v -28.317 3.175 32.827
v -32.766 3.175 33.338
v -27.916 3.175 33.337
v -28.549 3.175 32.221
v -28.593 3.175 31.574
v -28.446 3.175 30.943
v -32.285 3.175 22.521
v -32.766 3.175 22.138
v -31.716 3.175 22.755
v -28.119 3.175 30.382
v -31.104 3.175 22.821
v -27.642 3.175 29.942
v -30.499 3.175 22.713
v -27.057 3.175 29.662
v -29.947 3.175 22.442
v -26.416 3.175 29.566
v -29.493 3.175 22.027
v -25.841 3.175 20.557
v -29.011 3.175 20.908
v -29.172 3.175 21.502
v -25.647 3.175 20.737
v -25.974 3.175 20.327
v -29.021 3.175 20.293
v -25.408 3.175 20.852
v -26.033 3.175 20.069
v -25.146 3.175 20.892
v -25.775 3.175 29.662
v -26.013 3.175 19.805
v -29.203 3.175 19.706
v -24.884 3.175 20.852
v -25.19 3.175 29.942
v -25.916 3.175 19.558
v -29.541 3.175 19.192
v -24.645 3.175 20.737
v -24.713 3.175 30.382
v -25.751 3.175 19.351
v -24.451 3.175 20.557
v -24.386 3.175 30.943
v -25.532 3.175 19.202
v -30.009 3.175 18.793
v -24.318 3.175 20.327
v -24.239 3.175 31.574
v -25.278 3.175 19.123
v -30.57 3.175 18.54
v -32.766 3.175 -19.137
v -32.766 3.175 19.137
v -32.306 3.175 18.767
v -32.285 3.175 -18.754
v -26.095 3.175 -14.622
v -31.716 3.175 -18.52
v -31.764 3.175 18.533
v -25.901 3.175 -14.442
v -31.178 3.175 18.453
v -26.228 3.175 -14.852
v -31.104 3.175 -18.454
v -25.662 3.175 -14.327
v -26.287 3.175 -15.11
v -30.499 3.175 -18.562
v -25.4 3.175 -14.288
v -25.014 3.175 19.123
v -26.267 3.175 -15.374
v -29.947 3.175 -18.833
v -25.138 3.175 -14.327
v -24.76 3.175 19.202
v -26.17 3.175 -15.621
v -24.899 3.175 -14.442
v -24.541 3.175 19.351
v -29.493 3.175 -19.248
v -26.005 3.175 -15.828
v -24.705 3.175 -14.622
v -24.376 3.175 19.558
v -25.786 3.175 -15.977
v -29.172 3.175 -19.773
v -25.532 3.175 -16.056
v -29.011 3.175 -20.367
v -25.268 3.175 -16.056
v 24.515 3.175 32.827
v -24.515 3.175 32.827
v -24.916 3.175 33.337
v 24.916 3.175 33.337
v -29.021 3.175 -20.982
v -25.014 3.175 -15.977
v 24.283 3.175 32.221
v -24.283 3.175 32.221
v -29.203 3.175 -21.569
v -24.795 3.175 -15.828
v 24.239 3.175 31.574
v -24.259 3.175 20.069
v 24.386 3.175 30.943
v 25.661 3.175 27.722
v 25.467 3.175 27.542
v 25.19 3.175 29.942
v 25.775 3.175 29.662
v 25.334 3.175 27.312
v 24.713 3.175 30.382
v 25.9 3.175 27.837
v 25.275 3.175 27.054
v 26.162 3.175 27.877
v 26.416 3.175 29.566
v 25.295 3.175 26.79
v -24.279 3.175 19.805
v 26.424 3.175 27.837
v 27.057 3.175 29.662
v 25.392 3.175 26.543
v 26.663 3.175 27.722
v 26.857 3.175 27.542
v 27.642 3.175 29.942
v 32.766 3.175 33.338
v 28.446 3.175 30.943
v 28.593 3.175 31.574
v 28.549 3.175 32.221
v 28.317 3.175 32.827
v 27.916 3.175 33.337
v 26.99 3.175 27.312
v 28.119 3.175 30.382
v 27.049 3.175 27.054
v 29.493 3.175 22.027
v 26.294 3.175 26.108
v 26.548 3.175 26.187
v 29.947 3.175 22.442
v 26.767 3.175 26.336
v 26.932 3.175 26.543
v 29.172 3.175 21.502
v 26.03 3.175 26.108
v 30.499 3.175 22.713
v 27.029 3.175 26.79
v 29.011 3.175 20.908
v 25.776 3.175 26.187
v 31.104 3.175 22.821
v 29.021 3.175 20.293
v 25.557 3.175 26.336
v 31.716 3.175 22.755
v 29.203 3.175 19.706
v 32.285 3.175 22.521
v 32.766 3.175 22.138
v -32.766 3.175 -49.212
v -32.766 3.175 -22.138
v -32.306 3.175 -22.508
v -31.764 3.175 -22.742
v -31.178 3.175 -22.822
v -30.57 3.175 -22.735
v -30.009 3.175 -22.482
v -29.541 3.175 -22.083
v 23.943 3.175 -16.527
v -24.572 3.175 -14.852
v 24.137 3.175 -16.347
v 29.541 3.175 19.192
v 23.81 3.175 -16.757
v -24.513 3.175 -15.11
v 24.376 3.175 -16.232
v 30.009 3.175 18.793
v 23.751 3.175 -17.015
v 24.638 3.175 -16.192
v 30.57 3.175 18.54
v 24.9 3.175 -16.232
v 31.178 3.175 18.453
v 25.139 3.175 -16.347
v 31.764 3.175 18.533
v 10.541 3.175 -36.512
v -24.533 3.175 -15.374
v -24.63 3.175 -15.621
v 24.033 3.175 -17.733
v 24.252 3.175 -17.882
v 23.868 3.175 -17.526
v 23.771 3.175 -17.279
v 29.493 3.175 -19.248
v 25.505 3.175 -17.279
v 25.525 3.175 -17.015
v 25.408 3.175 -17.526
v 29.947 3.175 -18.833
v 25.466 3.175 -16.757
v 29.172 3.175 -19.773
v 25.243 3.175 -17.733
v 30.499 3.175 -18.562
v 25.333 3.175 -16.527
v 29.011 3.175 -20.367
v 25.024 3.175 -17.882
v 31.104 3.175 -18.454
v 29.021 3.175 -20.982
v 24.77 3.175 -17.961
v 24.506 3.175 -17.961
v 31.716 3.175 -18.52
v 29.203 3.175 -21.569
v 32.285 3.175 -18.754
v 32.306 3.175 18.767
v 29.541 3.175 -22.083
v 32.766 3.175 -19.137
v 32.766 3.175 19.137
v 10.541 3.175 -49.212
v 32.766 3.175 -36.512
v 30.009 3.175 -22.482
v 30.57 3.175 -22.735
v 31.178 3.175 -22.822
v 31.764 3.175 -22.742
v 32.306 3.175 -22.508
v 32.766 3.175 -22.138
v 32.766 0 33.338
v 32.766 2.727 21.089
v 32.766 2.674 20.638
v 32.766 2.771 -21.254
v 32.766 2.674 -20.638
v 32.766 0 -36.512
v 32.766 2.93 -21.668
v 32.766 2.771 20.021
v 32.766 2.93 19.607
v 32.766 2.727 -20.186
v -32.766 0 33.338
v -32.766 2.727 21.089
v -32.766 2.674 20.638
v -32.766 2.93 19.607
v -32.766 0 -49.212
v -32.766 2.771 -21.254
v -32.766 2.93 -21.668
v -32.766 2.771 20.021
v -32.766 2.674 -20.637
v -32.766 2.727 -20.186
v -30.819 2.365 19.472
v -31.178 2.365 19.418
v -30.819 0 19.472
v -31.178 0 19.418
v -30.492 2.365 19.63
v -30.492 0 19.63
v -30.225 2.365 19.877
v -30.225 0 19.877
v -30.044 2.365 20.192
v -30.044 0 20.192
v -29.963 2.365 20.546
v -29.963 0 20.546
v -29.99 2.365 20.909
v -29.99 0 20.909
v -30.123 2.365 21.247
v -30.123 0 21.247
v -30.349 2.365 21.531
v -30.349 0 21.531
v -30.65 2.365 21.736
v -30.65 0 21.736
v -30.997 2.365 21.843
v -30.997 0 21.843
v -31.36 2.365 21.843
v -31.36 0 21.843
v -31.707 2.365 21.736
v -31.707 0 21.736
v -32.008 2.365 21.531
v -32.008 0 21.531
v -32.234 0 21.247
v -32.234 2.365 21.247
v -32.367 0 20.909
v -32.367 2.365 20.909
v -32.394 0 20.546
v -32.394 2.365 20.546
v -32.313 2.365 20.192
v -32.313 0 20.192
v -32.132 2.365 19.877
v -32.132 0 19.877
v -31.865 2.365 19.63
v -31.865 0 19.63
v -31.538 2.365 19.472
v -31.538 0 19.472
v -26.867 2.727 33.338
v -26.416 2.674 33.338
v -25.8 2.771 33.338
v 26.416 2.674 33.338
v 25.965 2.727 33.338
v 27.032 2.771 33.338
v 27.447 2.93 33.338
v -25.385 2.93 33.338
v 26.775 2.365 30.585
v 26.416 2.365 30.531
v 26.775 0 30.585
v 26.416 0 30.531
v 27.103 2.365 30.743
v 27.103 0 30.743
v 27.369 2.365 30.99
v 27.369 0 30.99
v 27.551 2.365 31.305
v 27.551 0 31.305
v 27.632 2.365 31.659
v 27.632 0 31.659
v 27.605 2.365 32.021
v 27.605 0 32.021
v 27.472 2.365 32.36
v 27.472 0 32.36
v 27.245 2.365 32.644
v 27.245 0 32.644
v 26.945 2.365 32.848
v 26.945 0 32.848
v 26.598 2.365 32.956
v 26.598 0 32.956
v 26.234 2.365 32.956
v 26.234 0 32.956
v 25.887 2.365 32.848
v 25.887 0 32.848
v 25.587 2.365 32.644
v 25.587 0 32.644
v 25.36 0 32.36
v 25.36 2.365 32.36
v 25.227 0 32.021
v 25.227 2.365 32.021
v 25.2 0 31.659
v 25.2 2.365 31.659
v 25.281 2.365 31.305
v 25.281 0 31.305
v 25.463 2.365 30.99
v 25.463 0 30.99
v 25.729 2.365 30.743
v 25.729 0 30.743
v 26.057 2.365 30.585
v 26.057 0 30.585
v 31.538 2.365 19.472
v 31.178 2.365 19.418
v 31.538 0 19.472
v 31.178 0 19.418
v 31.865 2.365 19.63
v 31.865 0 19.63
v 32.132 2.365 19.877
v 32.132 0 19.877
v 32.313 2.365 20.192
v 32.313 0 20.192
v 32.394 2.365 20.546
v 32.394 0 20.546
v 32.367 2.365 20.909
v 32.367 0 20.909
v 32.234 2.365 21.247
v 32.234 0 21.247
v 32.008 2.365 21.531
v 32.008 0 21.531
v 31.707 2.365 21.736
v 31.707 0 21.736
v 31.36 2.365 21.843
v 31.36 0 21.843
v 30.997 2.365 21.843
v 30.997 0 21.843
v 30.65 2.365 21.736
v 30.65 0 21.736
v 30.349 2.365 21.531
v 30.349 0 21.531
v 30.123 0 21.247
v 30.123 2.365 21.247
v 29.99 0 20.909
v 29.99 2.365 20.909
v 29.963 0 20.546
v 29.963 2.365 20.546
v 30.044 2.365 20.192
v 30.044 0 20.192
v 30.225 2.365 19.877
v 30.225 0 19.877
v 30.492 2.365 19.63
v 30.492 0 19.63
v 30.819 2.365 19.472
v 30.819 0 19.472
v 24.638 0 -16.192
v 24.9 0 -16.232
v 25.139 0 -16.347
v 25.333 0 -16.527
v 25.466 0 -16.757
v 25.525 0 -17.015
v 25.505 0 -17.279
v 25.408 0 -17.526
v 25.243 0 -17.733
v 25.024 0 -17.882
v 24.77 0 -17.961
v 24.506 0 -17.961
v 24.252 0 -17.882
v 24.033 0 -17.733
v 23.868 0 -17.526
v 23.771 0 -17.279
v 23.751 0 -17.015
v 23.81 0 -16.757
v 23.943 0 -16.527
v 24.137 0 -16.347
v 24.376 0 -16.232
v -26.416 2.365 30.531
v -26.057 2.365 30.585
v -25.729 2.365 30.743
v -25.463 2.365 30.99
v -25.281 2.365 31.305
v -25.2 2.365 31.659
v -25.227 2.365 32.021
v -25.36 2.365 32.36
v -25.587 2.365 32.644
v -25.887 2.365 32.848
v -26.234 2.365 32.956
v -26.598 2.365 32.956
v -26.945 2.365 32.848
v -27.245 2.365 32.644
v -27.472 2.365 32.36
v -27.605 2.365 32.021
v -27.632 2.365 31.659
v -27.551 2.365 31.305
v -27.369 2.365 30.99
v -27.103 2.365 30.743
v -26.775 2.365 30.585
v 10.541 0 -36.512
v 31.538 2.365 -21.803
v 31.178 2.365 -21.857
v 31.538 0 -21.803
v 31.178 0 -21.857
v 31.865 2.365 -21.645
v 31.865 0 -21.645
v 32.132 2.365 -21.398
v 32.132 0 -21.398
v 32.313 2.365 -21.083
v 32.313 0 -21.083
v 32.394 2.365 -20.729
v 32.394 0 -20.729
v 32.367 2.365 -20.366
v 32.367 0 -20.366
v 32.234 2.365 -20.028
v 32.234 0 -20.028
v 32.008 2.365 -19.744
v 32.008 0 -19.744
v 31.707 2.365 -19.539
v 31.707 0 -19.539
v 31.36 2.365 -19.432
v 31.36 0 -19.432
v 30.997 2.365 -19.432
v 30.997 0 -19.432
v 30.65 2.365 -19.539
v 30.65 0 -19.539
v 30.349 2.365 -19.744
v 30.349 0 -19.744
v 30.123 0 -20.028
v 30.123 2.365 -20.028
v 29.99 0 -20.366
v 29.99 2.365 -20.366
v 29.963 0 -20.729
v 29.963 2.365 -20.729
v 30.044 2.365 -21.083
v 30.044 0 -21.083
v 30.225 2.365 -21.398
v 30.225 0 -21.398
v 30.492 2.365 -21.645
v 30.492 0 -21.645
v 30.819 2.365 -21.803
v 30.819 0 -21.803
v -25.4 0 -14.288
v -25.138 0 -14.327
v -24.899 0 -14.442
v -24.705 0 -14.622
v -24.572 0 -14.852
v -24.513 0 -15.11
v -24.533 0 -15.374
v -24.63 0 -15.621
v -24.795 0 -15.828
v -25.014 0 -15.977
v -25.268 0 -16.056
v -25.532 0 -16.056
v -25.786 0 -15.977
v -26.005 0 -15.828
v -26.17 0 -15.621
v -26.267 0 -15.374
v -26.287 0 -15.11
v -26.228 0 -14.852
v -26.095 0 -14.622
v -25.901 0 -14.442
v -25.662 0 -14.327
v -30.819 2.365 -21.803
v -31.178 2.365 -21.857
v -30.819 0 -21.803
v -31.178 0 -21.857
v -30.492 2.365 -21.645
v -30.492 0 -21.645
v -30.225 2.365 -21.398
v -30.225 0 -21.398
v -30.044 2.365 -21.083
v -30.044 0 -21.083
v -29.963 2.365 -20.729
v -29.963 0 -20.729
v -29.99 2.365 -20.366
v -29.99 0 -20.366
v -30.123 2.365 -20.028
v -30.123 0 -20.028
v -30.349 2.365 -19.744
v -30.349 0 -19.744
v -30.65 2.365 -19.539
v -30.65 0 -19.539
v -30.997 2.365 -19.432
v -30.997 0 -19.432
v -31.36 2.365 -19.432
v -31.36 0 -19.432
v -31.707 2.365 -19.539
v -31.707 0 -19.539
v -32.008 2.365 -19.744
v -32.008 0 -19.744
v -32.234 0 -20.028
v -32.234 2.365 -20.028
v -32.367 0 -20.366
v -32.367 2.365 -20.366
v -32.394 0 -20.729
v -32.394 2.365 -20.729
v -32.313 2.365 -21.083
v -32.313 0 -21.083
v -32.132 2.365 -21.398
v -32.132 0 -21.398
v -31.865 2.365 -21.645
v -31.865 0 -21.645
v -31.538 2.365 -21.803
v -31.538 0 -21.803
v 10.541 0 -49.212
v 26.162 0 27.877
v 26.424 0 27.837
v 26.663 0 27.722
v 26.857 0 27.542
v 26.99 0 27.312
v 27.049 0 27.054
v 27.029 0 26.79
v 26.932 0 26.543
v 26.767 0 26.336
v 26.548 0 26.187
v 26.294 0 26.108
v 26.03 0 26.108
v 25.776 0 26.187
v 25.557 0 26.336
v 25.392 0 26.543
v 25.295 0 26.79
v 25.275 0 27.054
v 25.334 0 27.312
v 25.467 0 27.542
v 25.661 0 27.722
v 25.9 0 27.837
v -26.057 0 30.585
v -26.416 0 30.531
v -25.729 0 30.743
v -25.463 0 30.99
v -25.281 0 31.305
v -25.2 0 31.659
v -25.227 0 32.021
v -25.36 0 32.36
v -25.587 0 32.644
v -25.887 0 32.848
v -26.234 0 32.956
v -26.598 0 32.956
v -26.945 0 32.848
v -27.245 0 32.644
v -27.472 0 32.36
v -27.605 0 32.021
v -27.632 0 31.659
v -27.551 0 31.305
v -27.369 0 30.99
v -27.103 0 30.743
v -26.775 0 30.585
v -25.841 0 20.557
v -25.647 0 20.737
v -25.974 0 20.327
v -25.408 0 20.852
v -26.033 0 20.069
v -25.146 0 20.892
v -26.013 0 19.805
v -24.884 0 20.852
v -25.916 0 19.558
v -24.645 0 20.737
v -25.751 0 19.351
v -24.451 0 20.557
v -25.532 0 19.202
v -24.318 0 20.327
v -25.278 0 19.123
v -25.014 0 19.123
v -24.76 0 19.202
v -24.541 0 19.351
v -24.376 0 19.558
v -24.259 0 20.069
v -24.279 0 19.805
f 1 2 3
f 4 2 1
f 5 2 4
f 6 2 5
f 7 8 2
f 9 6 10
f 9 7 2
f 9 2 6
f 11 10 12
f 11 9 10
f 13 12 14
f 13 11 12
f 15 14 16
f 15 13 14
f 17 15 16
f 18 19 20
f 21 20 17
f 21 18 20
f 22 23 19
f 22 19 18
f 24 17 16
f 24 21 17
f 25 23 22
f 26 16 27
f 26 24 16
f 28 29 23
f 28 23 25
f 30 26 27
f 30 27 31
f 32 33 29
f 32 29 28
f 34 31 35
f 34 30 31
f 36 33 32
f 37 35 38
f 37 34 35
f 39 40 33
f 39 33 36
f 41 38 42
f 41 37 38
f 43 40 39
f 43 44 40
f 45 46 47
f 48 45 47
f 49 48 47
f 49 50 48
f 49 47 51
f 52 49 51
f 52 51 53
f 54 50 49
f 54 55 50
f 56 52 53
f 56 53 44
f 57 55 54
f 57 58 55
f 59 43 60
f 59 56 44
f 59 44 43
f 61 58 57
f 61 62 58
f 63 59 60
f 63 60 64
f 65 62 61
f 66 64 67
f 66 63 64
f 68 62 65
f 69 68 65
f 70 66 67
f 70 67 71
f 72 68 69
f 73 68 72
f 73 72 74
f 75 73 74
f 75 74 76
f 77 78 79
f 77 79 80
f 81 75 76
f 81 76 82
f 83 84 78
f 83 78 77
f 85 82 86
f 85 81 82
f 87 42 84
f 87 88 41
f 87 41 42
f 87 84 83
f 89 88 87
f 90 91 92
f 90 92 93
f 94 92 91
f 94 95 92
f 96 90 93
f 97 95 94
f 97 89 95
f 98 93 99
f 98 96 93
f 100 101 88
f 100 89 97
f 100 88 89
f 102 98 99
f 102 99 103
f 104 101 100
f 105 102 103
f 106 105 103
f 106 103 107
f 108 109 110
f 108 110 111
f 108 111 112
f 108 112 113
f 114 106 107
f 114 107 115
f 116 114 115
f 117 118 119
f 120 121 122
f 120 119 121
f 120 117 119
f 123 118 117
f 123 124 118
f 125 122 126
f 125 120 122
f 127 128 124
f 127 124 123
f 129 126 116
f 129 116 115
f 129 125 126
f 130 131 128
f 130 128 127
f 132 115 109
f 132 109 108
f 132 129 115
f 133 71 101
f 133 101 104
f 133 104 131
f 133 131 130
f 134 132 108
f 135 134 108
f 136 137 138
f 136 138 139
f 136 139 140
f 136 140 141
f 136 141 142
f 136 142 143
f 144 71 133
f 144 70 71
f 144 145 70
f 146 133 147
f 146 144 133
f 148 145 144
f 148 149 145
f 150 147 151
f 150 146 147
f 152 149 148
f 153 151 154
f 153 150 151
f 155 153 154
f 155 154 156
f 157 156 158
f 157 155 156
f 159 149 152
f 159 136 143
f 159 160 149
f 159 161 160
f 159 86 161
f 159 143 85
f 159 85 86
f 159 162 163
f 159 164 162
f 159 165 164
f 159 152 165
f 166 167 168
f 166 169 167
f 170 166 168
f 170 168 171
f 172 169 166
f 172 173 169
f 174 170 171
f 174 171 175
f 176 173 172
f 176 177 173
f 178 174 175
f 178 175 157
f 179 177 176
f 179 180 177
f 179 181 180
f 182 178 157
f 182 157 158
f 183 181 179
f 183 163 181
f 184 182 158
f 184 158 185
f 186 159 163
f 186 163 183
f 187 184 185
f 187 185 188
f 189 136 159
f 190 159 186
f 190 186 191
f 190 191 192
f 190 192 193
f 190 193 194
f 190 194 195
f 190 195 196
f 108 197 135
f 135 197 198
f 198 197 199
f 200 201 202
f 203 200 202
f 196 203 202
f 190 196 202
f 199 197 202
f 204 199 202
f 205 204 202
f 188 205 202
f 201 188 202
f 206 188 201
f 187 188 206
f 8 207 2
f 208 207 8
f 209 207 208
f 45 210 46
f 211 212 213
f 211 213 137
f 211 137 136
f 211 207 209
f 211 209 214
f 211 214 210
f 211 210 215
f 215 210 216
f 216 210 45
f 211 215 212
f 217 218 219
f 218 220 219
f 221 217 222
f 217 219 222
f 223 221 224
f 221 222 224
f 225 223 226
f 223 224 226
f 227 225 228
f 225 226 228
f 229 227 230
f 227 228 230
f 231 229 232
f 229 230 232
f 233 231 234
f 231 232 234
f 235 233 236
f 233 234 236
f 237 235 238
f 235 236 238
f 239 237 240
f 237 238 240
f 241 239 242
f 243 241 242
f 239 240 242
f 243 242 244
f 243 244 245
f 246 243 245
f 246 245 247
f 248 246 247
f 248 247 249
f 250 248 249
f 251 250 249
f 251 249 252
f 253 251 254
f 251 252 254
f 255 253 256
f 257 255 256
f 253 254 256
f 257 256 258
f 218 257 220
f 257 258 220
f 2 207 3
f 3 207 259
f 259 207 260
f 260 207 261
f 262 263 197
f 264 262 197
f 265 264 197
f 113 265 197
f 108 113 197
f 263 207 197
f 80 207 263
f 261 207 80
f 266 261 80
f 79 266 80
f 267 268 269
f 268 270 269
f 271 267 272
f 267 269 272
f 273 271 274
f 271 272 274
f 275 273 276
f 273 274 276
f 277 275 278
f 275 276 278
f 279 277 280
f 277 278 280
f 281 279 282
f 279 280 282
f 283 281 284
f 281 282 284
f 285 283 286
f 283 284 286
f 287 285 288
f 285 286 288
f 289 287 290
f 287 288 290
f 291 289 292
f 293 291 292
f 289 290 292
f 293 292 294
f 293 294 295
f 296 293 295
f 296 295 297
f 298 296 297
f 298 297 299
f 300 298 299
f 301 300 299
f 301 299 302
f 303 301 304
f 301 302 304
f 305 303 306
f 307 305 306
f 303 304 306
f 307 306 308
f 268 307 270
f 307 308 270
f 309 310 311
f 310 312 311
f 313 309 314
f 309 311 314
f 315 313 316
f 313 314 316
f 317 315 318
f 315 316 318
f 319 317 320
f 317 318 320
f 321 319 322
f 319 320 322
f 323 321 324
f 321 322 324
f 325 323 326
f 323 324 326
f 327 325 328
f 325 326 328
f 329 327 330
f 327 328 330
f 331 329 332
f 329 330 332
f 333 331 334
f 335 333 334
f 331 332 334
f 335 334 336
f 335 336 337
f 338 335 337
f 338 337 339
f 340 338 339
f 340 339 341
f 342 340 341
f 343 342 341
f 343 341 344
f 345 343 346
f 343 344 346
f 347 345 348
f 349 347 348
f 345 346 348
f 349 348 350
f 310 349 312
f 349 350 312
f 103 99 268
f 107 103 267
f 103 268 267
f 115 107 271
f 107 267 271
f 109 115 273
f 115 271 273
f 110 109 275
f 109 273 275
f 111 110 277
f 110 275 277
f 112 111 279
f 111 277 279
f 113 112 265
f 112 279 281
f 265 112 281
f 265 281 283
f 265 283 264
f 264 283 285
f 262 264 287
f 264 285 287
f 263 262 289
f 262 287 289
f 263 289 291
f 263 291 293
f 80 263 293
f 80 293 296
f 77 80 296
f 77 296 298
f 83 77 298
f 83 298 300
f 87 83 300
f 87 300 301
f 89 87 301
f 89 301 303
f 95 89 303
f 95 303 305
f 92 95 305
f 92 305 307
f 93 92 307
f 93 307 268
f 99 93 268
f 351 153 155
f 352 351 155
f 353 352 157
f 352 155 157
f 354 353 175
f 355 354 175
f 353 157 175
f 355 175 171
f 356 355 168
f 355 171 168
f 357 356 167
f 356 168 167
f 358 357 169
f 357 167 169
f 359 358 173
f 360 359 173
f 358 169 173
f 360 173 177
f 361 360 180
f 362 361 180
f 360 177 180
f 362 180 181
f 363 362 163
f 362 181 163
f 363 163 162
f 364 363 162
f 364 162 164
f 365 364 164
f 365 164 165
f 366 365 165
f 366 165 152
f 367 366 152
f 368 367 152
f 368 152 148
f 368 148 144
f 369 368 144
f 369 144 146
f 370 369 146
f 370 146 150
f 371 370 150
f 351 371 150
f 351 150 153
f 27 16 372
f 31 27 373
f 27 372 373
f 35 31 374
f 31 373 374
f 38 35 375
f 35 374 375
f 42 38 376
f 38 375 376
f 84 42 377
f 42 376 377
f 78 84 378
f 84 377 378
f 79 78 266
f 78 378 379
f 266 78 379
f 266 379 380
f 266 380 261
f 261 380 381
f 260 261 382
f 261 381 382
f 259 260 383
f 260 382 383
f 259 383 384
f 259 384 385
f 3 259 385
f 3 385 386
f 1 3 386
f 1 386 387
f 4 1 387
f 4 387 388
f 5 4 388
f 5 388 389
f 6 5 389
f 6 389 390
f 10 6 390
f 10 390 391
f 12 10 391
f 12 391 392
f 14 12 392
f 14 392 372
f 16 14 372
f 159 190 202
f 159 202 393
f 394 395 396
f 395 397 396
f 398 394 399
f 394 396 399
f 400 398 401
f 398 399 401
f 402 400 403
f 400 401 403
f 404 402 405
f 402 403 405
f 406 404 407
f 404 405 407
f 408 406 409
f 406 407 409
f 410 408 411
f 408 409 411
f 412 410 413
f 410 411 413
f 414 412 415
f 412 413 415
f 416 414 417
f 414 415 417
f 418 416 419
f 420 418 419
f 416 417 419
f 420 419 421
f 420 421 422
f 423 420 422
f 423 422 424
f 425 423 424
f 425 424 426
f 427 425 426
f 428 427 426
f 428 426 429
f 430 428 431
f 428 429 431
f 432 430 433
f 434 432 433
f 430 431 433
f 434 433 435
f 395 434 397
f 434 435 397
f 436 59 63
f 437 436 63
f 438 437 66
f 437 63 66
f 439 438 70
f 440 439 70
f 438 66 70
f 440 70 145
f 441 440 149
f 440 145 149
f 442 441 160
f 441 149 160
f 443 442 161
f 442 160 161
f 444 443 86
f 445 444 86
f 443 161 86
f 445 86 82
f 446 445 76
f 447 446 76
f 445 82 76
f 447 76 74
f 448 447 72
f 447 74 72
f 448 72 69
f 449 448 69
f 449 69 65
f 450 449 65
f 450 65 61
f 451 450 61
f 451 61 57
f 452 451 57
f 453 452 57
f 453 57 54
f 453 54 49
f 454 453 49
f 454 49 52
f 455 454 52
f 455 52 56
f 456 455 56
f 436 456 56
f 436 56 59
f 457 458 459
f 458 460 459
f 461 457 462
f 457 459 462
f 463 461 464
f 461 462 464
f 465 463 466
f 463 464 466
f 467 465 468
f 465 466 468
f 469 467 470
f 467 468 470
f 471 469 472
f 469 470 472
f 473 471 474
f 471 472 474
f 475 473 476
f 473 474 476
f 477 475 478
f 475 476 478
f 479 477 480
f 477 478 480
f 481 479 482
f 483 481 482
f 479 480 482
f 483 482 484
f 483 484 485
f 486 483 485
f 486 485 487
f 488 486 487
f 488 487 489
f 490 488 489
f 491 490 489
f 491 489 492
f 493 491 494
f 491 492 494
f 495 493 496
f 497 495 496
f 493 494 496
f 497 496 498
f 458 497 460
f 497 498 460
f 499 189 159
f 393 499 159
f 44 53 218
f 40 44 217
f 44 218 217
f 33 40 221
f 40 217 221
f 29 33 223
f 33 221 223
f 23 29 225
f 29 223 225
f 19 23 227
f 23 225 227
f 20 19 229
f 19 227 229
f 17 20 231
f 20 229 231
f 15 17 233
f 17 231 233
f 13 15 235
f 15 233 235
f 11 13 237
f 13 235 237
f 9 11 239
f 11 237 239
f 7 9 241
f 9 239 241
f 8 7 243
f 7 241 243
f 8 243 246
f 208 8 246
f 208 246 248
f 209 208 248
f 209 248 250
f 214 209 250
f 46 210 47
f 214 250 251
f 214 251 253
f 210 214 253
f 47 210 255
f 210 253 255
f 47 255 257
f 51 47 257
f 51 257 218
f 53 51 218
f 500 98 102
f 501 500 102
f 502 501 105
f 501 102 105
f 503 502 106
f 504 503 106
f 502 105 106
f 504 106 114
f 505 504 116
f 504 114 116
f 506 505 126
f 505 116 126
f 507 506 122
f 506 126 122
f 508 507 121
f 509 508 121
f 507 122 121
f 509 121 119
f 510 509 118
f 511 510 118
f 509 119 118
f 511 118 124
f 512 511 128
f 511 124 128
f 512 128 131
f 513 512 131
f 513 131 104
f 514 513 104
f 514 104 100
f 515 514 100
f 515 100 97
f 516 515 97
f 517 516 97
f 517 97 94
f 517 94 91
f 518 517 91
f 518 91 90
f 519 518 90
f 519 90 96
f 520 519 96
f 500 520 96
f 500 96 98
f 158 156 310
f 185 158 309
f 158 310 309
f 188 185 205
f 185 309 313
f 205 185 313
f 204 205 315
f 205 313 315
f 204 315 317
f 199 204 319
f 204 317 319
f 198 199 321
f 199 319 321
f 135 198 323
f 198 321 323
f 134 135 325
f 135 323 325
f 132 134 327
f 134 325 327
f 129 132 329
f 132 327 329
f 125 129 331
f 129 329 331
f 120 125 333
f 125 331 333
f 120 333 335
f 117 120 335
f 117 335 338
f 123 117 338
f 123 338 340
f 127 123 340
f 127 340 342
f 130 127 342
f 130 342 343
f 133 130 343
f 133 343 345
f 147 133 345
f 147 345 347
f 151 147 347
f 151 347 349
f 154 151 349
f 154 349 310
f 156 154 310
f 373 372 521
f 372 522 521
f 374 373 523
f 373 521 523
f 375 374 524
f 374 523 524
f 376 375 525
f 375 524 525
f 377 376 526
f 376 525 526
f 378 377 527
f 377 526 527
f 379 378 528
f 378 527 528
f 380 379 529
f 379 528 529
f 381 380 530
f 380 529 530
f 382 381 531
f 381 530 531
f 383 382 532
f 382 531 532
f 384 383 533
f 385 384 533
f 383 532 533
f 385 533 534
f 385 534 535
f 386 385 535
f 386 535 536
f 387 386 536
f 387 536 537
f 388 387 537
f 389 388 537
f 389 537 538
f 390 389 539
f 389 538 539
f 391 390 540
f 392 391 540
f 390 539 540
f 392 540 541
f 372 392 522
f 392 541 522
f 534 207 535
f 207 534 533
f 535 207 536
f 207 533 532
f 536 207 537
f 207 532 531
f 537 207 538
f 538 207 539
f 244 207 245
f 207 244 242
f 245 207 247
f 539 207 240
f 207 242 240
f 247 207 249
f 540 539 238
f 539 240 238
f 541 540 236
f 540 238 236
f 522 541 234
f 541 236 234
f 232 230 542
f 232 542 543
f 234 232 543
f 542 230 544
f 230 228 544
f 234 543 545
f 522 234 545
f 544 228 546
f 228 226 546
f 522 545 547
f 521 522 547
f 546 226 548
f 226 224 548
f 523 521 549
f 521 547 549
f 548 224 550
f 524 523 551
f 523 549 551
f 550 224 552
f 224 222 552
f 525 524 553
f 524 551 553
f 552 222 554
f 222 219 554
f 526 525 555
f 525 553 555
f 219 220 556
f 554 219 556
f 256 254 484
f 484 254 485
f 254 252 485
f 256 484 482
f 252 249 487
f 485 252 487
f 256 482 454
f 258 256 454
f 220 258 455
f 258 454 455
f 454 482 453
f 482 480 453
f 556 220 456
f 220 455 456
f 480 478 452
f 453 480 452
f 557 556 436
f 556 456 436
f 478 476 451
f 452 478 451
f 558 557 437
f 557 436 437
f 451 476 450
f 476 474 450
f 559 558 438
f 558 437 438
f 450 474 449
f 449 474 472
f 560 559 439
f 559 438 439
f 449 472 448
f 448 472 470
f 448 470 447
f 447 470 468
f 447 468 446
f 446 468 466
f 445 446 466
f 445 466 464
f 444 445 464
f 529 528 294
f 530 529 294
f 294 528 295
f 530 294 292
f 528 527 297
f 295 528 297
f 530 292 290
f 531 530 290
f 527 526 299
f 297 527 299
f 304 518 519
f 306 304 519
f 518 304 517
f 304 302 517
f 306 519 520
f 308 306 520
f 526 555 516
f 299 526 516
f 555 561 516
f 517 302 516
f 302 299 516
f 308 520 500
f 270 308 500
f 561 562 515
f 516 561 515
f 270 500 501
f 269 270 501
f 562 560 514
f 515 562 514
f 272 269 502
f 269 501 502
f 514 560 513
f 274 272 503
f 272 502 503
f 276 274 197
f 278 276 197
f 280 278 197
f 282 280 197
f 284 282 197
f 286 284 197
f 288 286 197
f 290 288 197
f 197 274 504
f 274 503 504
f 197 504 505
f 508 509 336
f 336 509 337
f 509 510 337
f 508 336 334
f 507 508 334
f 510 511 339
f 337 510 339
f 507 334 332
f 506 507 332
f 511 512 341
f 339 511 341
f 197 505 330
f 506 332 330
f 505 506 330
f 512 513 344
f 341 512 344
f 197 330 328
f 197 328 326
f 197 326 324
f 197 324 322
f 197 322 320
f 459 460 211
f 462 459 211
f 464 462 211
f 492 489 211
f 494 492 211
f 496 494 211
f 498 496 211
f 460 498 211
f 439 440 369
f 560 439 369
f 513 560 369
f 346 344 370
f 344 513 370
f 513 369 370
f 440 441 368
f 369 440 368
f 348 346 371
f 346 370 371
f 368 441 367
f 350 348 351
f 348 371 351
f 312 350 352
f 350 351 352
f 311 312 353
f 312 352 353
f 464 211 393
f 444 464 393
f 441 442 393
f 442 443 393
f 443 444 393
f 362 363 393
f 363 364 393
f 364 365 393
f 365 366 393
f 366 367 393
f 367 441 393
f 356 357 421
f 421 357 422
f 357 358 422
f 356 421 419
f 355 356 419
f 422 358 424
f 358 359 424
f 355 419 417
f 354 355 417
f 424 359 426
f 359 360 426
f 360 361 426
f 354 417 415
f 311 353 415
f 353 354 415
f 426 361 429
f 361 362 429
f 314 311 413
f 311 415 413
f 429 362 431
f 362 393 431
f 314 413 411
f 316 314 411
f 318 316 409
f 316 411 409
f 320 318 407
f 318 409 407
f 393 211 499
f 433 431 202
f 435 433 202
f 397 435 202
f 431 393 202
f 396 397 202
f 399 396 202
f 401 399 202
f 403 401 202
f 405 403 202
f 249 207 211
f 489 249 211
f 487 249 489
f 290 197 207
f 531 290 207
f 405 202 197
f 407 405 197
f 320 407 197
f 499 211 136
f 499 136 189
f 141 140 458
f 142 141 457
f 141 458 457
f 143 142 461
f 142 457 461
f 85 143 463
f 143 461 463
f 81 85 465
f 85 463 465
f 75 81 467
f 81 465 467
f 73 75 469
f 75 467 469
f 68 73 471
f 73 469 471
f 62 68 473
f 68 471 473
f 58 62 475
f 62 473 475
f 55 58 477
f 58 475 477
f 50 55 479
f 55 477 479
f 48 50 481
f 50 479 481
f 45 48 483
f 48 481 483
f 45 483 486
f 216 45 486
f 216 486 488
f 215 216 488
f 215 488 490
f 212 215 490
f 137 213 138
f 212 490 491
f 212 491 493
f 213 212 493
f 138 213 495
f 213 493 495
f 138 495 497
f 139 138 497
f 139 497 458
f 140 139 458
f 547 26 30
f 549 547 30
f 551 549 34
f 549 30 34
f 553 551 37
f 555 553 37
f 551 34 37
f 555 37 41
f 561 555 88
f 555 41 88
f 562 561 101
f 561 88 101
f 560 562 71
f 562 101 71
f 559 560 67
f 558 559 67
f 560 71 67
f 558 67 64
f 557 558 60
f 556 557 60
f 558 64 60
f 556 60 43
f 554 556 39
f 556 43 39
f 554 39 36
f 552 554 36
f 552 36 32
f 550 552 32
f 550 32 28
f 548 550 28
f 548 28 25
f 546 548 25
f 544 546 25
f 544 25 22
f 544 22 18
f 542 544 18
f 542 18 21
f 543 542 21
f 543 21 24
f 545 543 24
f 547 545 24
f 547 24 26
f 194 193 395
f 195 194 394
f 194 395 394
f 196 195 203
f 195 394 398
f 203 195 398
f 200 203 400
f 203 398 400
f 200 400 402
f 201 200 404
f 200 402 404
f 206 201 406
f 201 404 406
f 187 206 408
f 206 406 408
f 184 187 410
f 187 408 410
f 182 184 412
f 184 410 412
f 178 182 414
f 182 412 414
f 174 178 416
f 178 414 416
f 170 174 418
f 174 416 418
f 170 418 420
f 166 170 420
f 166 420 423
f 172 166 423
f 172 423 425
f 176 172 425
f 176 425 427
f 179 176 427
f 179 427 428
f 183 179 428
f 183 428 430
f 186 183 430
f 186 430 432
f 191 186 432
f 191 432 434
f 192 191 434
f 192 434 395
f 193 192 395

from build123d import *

# Parameters (mm, degrees)
SKETCH1_W                                         = 65.532
SKETCH1_H                                         = 82.55
EXTRUDE1_DEPTH                                    = 3.175
CSK_FOR_2_FLAT_HEAD_MACHINE_SCREW_100_D           = 2.4384
CSK_FOR_2_FLAT_HEAD_MACHINE_SCREW_100_CSINK_D     = 4.3688
CSK_FOR_2_FLAT_HEAD_MACHINE_SCREW_100_CSINK_ANGLE = 100
SKETCH3_W                                         = 22.225
SKETCH3_H                                         = 12.7
CUT_EXTRUDE1_DEPTH                                = 4.175
TAP_DRILL_FOR_2_TAP1_D                            = 1.778
TAP_DRILL_FOR_2_TAP1_DEPTH                        = 6.35
TAP_DRILL_FOR_2_TAP1_TIP                          = 0.53416509


with BuildPart() as part:
    # Sketch1 → Extrude1 (new body)
    with BuildSketch(Plane(origin=(0, 0, 0), x_dir=(1, 0, 0), z_dir=(0, 1, 0))):
        with Locations((0, 7.9375)):
            Rectangle(SKETCH1_W, SKETCH1_H)
    extrude(amount=EXTRUDE1_DEPTH)

    # CSK for #2 Flat Head Machine Screw (100)1 (through all)
    with Locations(Plane(origin=(-26.416, 3.175, 31.75), x_dir=(0, 0, 1), z_dir=(0, 1, 0))):
        with Locations((0, 0), (0, 52.832), (-52.387499988, -4.7625), (-11.1125, -4.7625), (-52.3875, 57.5945), (-11.1125, 57.5945)):
            CounterSinkHole(CSK_FOR_2_FLAT_HEAD_MACHINE_SCREW_100_D / 2, CSK_FOR_2_FLAT_HEAD_MACHINE_SCREW_100_CSINK_D / 2, counter_sink_angle=CSK_FOR_2_FLAT_HEAD_MACHINE_SCREW_100_CSINK_ANGLE)

    # Sketch3 → Cut-Extrude1 (cut, through all)
    with BuildSketch(Plane(origin=(0, 3.175, 0), x_dir=(-1, 0, 0), z_dir=(0, 1, 0))):
        with Locations((-21.6535, -42.8625)):
            Rectangle(SKETCH3_W, SKETCH3_H)
    extrude(amount=-CUT_EXTRUDE1_DEPTH, mode=Mode.SUBTRACT)

    # Tap Drill for #2 Tap1
    with Locations(Plane(origin=(24.638, 0, -17.0815), x_dir=(0, 0, -1), z_dir=(0, -1, 0))):
        with Locations((0, 0), (-1.905, -50.038), (-37.084, -49.784), (-44.069, 1.524)):
            Hole(TAP_DRILL_FOR_2_TAP1_D / 2, depth=TAP_DRILL_FOR_2_TAP1_DEPTH)
            with Locations((0, 0, -(TAP_DRILL_FOR_2_TAP1_DEPTH + TAP_DRILL_FOR_2_TAP1_TIP / 2))):  # 118° drill point
                Cone(0, TAP_DRILL_FOR_2_TAP1_D / 2, TAP_DRILL_FOR_2_TAP1_TIP, mode=Mode.SUBTRACT)


solid = part.part
